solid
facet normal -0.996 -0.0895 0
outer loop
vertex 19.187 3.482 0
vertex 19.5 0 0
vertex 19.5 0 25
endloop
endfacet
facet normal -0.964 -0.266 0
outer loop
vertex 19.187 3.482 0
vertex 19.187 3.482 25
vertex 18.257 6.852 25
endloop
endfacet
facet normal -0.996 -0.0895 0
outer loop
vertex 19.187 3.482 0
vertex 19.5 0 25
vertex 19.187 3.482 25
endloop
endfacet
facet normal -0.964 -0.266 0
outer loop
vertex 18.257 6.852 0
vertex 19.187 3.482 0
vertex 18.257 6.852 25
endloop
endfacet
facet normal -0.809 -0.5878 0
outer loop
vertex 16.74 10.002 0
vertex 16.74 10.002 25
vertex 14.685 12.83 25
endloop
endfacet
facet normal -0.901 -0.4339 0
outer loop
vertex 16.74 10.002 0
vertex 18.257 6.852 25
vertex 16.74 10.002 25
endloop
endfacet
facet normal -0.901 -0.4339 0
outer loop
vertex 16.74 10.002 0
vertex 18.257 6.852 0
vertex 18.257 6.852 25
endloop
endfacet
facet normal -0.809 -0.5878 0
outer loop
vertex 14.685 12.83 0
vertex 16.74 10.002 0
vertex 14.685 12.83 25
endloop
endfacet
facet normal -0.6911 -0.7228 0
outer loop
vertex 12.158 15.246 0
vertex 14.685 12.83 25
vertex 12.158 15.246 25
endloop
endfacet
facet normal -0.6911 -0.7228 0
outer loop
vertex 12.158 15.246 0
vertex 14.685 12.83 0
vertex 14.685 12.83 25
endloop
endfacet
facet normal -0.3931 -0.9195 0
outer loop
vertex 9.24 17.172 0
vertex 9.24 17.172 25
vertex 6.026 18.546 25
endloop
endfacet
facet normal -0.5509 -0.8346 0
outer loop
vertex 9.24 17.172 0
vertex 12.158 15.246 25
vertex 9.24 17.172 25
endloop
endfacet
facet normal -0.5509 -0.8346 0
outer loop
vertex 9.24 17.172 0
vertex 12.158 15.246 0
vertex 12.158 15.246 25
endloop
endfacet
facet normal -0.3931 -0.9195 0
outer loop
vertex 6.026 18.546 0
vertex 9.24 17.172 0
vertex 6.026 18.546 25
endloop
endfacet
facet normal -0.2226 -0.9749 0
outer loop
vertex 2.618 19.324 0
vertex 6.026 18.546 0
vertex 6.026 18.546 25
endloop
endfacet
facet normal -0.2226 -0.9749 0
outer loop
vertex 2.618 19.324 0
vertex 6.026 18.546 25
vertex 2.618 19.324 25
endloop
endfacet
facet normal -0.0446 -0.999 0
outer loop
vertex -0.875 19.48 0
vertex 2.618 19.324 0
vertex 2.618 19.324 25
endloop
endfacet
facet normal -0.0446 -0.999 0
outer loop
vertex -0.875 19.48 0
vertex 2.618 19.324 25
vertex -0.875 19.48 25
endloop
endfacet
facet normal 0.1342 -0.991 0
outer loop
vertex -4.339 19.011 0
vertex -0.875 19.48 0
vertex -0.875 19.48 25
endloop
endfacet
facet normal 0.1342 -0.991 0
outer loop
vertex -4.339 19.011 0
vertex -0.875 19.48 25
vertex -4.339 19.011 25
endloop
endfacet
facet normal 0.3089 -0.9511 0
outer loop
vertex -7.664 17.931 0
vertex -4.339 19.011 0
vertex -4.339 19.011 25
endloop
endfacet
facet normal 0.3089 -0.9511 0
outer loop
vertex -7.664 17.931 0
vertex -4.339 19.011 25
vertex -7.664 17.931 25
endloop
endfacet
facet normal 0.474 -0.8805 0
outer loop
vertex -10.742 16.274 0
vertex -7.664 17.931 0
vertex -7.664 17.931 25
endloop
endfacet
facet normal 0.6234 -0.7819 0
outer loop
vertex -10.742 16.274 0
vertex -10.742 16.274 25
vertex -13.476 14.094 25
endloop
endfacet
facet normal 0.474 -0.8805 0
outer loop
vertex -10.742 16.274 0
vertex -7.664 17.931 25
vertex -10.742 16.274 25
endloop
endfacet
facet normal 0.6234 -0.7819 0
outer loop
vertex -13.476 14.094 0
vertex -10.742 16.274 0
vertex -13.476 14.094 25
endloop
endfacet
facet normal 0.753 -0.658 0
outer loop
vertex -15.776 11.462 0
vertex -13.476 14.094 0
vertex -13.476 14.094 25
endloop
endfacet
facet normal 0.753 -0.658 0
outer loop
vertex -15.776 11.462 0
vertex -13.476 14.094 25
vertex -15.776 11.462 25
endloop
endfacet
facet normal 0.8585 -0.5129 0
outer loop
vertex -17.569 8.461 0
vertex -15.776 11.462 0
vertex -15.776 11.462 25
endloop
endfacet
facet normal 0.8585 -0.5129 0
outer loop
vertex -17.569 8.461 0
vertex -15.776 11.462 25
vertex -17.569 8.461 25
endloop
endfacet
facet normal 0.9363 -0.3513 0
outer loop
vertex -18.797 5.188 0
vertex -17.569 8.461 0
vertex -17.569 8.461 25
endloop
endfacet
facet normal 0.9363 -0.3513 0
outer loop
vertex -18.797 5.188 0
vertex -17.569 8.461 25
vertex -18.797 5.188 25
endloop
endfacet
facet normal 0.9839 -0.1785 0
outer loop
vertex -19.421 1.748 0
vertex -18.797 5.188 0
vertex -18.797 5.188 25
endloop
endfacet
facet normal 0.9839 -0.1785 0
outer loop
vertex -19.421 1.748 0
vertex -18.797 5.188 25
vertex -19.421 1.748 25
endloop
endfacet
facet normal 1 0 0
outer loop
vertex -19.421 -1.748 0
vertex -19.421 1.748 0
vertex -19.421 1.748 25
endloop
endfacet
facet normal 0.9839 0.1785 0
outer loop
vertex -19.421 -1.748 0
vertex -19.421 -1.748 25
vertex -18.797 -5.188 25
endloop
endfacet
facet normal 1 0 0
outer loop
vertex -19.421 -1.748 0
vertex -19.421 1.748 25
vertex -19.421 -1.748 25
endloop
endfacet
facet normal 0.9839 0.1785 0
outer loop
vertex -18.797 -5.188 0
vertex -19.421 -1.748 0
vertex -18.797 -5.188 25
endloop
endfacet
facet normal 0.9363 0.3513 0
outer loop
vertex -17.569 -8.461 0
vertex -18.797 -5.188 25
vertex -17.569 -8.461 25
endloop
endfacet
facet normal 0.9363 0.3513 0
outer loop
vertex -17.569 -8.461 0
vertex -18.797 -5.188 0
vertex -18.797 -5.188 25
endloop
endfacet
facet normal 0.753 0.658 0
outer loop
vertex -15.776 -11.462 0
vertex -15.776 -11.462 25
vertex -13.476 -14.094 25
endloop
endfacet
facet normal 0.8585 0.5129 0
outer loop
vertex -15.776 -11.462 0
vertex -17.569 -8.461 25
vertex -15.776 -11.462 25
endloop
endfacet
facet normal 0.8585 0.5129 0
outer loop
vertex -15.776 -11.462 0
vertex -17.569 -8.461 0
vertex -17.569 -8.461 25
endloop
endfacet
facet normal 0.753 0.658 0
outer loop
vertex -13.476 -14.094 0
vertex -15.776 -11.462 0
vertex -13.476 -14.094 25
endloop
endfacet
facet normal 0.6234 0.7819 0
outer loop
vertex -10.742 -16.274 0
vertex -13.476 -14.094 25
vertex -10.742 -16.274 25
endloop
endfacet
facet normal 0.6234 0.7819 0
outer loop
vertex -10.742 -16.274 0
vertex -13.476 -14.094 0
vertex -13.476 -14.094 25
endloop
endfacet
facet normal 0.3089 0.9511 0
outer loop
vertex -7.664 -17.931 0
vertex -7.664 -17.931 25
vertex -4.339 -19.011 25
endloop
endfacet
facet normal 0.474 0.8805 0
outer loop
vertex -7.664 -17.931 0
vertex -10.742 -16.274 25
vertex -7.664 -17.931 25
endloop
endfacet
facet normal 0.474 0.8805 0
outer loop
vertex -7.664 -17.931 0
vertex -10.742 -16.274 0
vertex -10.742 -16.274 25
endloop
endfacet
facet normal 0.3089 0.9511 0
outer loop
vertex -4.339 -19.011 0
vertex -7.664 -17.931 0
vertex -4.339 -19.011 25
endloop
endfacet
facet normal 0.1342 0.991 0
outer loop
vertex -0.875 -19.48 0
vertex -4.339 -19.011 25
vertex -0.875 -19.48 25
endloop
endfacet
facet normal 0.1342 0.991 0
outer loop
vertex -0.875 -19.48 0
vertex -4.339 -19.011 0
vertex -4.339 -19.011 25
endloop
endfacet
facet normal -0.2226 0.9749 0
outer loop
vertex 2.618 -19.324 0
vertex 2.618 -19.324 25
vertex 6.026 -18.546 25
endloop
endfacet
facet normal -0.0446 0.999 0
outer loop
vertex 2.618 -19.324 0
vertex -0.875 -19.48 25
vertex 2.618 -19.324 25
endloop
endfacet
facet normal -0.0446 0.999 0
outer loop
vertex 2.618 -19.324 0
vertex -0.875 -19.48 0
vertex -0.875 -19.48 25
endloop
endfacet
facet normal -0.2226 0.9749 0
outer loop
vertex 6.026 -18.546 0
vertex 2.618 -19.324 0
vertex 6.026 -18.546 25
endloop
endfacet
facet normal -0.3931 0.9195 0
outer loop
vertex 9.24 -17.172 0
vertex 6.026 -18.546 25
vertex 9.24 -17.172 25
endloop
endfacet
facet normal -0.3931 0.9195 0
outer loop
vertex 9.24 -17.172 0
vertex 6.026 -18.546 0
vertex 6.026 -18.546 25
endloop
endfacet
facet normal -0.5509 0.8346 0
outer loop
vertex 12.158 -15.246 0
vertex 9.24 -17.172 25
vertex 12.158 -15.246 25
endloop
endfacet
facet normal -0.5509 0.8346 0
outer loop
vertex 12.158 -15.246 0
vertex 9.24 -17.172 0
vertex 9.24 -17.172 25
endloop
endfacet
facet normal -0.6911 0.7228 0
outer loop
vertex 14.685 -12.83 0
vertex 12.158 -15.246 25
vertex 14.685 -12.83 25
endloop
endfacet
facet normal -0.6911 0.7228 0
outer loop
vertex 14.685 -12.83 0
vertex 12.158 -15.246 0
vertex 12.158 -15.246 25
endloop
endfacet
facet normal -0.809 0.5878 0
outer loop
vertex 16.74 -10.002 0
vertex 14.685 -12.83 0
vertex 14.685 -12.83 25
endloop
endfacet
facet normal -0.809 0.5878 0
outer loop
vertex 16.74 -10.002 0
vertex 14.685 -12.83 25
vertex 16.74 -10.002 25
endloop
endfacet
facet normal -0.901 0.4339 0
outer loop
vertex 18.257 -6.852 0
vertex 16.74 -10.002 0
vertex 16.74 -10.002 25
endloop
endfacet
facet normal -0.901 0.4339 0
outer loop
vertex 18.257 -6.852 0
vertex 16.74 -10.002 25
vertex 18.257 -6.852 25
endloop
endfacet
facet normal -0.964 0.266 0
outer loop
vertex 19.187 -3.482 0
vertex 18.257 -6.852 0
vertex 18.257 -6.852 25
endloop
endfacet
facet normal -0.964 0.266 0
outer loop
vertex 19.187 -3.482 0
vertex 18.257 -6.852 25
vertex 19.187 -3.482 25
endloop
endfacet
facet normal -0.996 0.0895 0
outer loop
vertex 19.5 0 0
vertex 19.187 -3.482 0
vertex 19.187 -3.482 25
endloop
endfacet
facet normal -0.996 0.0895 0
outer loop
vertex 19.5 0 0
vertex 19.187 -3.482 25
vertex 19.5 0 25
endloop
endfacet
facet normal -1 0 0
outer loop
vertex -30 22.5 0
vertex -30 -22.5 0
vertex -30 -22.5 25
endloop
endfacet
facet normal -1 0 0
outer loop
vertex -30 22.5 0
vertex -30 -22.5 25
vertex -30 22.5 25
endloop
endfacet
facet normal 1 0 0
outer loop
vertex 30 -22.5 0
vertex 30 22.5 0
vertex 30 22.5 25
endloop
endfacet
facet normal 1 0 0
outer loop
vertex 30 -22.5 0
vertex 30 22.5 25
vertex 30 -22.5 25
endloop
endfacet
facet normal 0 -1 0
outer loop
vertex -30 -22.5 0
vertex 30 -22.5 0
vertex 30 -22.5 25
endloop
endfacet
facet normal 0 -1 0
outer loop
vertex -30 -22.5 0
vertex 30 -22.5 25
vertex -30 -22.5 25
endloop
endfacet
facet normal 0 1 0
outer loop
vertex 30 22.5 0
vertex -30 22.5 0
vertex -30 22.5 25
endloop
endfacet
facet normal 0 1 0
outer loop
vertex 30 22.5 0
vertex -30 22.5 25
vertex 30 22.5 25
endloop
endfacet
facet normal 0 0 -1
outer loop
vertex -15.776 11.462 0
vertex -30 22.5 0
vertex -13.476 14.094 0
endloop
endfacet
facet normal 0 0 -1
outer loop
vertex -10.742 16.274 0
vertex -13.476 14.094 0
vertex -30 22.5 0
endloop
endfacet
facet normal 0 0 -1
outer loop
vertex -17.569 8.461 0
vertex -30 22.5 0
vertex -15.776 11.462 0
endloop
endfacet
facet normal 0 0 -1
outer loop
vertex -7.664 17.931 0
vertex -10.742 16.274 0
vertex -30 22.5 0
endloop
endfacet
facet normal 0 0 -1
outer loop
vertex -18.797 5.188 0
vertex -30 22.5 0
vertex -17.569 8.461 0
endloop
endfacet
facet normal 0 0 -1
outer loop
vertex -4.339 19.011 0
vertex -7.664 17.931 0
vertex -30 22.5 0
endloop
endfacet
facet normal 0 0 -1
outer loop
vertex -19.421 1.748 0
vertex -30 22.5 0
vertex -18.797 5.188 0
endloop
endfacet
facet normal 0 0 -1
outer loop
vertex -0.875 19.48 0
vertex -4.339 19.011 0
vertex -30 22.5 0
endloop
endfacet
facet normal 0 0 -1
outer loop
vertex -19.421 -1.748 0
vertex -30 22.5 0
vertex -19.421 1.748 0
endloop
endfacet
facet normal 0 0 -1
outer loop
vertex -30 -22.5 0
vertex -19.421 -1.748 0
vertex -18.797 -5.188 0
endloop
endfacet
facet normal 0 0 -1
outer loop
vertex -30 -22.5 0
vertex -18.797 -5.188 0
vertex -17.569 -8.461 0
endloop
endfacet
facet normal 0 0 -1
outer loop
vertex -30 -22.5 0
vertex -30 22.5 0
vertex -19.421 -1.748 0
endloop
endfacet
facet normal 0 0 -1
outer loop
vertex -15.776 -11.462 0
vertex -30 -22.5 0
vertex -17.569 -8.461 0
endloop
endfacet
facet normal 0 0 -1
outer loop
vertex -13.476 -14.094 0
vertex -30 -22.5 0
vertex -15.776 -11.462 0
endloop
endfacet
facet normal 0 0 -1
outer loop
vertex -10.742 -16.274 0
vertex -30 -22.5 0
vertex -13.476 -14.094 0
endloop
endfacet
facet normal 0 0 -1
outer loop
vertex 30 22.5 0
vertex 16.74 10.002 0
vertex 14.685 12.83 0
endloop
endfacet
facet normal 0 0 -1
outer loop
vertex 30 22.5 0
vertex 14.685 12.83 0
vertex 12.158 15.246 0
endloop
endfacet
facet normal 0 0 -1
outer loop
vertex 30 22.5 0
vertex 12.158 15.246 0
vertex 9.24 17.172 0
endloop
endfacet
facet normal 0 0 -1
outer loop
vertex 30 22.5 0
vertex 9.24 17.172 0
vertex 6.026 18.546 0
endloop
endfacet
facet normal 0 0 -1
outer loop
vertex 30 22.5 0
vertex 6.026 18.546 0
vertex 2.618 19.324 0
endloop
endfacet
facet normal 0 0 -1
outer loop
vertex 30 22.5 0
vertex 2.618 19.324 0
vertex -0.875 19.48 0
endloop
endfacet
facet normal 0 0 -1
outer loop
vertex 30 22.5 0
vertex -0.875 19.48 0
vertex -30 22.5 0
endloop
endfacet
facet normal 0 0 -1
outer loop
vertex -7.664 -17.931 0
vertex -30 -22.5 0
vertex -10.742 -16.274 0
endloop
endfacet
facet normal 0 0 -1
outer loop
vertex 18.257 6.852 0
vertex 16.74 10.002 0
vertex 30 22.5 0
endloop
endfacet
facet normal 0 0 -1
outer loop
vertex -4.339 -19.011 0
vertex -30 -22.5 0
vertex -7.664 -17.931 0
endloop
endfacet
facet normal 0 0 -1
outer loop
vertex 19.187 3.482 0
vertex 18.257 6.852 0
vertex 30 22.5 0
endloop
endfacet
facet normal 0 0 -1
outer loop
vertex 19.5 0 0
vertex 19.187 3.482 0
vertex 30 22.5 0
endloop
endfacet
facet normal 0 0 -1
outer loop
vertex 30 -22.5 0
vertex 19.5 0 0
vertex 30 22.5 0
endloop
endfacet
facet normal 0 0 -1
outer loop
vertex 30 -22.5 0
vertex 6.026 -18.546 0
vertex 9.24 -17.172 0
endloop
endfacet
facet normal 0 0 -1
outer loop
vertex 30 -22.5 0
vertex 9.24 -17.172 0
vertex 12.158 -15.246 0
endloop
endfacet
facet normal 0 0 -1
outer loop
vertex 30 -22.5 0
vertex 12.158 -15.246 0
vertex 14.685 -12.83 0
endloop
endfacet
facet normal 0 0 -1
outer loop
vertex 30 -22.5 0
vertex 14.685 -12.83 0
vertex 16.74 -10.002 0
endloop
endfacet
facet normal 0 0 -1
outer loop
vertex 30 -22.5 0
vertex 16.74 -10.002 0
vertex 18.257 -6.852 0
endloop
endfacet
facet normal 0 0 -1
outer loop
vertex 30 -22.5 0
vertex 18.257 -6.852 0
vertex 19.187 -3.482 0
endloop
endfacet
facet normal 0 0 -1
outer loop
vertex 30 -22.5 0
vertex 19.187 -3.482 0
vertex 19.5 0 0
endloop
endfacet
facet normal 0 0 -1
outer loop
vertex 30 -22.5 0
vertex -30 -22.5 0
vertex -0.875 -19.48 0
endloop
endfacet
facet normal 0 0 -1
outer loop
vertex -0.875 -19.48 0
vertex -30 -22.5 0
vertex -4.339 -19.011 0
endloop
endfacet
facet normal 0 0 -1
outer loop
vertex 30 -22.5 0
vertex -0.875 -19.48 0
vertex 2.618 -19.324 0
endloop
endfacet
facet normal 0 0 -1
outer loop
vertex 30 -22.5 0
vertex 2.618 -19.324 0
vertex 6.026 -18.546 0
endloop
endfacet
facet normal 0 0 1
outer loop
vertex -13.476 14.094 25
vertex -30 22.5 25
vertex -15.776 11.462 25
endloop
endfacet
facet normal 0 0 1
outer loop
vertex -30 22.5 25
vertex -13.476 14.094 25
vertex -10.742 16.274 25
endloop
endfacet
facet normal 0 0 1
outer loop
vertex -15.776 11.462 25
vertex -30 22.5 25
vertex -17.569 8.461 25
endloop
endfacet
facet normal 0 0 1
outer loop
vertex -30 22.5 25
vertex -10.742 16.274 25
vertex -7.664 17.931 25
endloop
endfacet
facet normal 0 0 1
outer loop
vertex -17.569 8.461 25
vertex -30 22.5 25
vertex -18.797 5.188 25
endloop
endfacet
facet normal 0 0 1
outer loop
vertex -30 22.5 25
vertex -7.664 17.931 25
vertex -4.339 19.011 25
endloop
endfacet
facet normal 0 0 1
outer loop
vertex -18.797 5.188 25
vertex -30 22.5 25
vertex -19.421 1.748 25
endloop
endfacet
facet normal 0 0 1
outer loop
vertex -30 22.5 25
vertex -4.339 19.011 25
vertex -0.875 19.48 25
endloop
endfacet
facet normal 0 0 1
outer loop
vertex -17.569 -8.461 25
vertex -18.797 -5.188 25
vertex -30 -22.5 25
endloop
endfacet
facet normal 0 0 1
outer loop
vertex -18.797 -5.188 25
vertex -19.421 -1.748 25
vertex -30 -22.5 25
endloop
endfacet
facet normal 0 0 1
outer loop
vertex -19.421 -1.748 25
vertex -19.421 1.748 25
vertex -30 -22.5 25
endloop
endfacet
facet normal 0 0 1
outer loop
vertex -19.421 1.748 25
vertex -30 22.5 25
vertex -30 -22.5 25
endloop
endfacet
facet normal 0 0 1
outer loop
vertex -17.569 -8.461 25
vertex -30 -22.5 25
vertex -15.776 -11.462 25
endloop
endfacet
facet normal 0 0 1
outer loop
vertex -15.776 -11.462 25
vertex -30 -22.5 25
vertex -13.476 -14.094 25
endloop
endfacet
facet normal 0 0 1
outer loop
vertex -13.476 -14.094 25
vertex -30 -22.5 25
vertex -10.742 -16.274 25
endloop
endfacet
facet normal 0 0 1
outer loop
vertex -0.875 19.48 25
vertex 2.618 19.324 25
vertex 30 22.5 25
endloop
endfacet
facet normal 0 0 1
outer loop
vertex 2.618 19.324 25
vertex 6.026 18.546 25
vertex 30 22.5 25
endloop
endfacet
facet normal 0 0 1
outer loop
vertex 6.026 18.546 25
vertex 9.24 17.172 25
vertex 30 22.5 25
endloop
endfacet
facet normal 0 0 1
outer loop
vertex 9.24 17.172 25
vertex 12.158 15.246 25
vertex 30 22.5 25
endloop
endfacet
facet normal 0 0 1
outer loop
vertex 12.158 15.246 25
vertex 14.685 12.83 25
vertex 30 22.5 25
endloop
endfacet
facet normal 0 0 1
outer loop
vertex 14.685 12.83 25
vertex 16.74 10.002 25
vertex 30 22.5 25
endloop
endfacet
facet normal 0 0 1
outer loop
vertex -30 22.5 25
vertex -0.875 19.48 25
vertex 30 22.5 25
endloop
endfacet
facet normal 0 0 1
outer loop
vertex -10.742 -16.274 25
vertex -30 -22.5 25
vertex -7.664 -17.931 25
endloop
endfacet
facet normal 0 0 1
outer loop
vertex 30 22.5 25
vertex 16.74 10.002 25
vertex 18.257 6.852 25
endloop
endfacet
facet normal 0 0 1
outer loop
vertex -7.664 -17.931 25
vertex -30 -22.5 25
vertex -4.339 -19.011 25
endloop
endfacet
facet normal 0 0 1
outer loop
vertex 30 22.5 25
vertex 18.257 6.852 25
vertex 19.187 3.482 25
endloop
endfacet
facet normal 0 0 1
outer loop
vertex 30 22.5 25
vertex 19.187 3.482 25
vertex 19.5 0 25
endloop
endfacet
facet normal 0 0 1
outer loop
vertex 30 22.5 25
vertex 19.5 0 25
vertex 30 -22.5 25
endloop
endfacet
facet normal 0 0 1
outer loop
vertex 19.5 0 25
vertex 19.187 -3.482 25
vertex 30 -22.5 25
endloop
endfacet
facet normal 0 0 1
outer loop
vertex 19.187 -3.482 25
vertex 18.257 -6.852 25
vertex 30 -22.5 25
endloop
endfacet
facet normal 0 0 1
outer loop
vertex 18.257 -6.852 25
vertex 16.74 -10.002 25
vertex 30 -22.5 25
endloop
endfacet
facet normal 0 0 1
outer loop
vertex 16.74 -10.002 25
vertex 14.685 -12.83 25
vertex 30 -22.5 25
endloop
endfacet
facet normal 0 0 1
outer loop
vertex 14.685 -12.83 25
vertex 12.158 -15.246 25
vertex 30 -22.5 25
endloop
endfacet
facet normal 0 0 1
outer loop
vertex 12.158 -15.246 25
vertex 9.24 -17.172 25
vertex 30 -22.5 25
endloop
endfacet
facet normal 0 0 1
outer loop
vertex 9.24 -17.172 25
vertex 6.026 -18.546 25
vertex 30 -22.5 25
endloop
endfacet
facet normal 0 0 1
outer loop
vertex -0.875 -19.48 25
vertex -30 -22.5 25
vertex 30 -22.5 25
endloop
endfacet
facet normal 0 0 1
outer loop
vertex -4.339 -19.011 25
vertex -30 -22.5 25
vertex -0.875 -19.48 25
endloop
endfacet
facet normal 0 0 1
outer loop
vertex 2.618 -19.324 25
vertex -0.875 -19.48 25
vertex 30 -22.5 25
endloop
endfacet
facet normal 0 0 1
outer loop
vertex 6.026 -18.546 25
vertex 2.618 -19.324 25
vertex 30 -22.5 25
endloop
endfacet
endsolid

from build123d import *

# Parameters (mm, degrees)
F0_R     = 22.5
F1_DEPTH = 25
F2_R     = 19.5
F3_DEPTH = 25.001
F5_DEPTH = 25


with BuildPart() as f1:
    # F0 (on Top) → F1 (new body)
    with BuildSketch(Plane.XY):
        Circle(F0_R)
    extrude(amount=F1_DEPTH)

    # F2 (on Top) → F3 (cut, through all)
    with BuildSketch(Plane.XY):
        Circle(F2_R)
    extrude(amount=F3_DEPTH, mode=Mode.SUBTRACT)

    # F4 (on face) → F5 (join)
    with BuildSketch(Plane(origin=(0, 0, 0), x_dir=(1, 0, 0), z_dir=(0, 0, -1))):
        with BuildLine():
            Line((-30, -22.5), (5.03e-08, -22.5))
            ThreePointArc((5.03e-08, -22.5), (-22.5, -1.28e-08), (2.47e-08, 22.5))
            Line((2.47e-08, 22.5), (-30, 22.5))
            Line((-30, 22.5), (-30, -22.5))
        make_face()
        with BuildLine():
            Line((5.03e-08, -22.5), (30, -22.5))
            Line((30, -22.5), (30, 22.5))
            Line((30, 22.5), (2.47e-08, 22.5))
            ThreePointArc((2.47e-08, 22.5), (15.9099025854, 15.909902568), (22.5, 0))
            ThreePointArc((22.5, 0), (15.9099025945, -15.9099025589), (5.03e-08, -22.5))
        make_face()
    extrude(amount=-F5_DEPTH)


solid = f1.part
